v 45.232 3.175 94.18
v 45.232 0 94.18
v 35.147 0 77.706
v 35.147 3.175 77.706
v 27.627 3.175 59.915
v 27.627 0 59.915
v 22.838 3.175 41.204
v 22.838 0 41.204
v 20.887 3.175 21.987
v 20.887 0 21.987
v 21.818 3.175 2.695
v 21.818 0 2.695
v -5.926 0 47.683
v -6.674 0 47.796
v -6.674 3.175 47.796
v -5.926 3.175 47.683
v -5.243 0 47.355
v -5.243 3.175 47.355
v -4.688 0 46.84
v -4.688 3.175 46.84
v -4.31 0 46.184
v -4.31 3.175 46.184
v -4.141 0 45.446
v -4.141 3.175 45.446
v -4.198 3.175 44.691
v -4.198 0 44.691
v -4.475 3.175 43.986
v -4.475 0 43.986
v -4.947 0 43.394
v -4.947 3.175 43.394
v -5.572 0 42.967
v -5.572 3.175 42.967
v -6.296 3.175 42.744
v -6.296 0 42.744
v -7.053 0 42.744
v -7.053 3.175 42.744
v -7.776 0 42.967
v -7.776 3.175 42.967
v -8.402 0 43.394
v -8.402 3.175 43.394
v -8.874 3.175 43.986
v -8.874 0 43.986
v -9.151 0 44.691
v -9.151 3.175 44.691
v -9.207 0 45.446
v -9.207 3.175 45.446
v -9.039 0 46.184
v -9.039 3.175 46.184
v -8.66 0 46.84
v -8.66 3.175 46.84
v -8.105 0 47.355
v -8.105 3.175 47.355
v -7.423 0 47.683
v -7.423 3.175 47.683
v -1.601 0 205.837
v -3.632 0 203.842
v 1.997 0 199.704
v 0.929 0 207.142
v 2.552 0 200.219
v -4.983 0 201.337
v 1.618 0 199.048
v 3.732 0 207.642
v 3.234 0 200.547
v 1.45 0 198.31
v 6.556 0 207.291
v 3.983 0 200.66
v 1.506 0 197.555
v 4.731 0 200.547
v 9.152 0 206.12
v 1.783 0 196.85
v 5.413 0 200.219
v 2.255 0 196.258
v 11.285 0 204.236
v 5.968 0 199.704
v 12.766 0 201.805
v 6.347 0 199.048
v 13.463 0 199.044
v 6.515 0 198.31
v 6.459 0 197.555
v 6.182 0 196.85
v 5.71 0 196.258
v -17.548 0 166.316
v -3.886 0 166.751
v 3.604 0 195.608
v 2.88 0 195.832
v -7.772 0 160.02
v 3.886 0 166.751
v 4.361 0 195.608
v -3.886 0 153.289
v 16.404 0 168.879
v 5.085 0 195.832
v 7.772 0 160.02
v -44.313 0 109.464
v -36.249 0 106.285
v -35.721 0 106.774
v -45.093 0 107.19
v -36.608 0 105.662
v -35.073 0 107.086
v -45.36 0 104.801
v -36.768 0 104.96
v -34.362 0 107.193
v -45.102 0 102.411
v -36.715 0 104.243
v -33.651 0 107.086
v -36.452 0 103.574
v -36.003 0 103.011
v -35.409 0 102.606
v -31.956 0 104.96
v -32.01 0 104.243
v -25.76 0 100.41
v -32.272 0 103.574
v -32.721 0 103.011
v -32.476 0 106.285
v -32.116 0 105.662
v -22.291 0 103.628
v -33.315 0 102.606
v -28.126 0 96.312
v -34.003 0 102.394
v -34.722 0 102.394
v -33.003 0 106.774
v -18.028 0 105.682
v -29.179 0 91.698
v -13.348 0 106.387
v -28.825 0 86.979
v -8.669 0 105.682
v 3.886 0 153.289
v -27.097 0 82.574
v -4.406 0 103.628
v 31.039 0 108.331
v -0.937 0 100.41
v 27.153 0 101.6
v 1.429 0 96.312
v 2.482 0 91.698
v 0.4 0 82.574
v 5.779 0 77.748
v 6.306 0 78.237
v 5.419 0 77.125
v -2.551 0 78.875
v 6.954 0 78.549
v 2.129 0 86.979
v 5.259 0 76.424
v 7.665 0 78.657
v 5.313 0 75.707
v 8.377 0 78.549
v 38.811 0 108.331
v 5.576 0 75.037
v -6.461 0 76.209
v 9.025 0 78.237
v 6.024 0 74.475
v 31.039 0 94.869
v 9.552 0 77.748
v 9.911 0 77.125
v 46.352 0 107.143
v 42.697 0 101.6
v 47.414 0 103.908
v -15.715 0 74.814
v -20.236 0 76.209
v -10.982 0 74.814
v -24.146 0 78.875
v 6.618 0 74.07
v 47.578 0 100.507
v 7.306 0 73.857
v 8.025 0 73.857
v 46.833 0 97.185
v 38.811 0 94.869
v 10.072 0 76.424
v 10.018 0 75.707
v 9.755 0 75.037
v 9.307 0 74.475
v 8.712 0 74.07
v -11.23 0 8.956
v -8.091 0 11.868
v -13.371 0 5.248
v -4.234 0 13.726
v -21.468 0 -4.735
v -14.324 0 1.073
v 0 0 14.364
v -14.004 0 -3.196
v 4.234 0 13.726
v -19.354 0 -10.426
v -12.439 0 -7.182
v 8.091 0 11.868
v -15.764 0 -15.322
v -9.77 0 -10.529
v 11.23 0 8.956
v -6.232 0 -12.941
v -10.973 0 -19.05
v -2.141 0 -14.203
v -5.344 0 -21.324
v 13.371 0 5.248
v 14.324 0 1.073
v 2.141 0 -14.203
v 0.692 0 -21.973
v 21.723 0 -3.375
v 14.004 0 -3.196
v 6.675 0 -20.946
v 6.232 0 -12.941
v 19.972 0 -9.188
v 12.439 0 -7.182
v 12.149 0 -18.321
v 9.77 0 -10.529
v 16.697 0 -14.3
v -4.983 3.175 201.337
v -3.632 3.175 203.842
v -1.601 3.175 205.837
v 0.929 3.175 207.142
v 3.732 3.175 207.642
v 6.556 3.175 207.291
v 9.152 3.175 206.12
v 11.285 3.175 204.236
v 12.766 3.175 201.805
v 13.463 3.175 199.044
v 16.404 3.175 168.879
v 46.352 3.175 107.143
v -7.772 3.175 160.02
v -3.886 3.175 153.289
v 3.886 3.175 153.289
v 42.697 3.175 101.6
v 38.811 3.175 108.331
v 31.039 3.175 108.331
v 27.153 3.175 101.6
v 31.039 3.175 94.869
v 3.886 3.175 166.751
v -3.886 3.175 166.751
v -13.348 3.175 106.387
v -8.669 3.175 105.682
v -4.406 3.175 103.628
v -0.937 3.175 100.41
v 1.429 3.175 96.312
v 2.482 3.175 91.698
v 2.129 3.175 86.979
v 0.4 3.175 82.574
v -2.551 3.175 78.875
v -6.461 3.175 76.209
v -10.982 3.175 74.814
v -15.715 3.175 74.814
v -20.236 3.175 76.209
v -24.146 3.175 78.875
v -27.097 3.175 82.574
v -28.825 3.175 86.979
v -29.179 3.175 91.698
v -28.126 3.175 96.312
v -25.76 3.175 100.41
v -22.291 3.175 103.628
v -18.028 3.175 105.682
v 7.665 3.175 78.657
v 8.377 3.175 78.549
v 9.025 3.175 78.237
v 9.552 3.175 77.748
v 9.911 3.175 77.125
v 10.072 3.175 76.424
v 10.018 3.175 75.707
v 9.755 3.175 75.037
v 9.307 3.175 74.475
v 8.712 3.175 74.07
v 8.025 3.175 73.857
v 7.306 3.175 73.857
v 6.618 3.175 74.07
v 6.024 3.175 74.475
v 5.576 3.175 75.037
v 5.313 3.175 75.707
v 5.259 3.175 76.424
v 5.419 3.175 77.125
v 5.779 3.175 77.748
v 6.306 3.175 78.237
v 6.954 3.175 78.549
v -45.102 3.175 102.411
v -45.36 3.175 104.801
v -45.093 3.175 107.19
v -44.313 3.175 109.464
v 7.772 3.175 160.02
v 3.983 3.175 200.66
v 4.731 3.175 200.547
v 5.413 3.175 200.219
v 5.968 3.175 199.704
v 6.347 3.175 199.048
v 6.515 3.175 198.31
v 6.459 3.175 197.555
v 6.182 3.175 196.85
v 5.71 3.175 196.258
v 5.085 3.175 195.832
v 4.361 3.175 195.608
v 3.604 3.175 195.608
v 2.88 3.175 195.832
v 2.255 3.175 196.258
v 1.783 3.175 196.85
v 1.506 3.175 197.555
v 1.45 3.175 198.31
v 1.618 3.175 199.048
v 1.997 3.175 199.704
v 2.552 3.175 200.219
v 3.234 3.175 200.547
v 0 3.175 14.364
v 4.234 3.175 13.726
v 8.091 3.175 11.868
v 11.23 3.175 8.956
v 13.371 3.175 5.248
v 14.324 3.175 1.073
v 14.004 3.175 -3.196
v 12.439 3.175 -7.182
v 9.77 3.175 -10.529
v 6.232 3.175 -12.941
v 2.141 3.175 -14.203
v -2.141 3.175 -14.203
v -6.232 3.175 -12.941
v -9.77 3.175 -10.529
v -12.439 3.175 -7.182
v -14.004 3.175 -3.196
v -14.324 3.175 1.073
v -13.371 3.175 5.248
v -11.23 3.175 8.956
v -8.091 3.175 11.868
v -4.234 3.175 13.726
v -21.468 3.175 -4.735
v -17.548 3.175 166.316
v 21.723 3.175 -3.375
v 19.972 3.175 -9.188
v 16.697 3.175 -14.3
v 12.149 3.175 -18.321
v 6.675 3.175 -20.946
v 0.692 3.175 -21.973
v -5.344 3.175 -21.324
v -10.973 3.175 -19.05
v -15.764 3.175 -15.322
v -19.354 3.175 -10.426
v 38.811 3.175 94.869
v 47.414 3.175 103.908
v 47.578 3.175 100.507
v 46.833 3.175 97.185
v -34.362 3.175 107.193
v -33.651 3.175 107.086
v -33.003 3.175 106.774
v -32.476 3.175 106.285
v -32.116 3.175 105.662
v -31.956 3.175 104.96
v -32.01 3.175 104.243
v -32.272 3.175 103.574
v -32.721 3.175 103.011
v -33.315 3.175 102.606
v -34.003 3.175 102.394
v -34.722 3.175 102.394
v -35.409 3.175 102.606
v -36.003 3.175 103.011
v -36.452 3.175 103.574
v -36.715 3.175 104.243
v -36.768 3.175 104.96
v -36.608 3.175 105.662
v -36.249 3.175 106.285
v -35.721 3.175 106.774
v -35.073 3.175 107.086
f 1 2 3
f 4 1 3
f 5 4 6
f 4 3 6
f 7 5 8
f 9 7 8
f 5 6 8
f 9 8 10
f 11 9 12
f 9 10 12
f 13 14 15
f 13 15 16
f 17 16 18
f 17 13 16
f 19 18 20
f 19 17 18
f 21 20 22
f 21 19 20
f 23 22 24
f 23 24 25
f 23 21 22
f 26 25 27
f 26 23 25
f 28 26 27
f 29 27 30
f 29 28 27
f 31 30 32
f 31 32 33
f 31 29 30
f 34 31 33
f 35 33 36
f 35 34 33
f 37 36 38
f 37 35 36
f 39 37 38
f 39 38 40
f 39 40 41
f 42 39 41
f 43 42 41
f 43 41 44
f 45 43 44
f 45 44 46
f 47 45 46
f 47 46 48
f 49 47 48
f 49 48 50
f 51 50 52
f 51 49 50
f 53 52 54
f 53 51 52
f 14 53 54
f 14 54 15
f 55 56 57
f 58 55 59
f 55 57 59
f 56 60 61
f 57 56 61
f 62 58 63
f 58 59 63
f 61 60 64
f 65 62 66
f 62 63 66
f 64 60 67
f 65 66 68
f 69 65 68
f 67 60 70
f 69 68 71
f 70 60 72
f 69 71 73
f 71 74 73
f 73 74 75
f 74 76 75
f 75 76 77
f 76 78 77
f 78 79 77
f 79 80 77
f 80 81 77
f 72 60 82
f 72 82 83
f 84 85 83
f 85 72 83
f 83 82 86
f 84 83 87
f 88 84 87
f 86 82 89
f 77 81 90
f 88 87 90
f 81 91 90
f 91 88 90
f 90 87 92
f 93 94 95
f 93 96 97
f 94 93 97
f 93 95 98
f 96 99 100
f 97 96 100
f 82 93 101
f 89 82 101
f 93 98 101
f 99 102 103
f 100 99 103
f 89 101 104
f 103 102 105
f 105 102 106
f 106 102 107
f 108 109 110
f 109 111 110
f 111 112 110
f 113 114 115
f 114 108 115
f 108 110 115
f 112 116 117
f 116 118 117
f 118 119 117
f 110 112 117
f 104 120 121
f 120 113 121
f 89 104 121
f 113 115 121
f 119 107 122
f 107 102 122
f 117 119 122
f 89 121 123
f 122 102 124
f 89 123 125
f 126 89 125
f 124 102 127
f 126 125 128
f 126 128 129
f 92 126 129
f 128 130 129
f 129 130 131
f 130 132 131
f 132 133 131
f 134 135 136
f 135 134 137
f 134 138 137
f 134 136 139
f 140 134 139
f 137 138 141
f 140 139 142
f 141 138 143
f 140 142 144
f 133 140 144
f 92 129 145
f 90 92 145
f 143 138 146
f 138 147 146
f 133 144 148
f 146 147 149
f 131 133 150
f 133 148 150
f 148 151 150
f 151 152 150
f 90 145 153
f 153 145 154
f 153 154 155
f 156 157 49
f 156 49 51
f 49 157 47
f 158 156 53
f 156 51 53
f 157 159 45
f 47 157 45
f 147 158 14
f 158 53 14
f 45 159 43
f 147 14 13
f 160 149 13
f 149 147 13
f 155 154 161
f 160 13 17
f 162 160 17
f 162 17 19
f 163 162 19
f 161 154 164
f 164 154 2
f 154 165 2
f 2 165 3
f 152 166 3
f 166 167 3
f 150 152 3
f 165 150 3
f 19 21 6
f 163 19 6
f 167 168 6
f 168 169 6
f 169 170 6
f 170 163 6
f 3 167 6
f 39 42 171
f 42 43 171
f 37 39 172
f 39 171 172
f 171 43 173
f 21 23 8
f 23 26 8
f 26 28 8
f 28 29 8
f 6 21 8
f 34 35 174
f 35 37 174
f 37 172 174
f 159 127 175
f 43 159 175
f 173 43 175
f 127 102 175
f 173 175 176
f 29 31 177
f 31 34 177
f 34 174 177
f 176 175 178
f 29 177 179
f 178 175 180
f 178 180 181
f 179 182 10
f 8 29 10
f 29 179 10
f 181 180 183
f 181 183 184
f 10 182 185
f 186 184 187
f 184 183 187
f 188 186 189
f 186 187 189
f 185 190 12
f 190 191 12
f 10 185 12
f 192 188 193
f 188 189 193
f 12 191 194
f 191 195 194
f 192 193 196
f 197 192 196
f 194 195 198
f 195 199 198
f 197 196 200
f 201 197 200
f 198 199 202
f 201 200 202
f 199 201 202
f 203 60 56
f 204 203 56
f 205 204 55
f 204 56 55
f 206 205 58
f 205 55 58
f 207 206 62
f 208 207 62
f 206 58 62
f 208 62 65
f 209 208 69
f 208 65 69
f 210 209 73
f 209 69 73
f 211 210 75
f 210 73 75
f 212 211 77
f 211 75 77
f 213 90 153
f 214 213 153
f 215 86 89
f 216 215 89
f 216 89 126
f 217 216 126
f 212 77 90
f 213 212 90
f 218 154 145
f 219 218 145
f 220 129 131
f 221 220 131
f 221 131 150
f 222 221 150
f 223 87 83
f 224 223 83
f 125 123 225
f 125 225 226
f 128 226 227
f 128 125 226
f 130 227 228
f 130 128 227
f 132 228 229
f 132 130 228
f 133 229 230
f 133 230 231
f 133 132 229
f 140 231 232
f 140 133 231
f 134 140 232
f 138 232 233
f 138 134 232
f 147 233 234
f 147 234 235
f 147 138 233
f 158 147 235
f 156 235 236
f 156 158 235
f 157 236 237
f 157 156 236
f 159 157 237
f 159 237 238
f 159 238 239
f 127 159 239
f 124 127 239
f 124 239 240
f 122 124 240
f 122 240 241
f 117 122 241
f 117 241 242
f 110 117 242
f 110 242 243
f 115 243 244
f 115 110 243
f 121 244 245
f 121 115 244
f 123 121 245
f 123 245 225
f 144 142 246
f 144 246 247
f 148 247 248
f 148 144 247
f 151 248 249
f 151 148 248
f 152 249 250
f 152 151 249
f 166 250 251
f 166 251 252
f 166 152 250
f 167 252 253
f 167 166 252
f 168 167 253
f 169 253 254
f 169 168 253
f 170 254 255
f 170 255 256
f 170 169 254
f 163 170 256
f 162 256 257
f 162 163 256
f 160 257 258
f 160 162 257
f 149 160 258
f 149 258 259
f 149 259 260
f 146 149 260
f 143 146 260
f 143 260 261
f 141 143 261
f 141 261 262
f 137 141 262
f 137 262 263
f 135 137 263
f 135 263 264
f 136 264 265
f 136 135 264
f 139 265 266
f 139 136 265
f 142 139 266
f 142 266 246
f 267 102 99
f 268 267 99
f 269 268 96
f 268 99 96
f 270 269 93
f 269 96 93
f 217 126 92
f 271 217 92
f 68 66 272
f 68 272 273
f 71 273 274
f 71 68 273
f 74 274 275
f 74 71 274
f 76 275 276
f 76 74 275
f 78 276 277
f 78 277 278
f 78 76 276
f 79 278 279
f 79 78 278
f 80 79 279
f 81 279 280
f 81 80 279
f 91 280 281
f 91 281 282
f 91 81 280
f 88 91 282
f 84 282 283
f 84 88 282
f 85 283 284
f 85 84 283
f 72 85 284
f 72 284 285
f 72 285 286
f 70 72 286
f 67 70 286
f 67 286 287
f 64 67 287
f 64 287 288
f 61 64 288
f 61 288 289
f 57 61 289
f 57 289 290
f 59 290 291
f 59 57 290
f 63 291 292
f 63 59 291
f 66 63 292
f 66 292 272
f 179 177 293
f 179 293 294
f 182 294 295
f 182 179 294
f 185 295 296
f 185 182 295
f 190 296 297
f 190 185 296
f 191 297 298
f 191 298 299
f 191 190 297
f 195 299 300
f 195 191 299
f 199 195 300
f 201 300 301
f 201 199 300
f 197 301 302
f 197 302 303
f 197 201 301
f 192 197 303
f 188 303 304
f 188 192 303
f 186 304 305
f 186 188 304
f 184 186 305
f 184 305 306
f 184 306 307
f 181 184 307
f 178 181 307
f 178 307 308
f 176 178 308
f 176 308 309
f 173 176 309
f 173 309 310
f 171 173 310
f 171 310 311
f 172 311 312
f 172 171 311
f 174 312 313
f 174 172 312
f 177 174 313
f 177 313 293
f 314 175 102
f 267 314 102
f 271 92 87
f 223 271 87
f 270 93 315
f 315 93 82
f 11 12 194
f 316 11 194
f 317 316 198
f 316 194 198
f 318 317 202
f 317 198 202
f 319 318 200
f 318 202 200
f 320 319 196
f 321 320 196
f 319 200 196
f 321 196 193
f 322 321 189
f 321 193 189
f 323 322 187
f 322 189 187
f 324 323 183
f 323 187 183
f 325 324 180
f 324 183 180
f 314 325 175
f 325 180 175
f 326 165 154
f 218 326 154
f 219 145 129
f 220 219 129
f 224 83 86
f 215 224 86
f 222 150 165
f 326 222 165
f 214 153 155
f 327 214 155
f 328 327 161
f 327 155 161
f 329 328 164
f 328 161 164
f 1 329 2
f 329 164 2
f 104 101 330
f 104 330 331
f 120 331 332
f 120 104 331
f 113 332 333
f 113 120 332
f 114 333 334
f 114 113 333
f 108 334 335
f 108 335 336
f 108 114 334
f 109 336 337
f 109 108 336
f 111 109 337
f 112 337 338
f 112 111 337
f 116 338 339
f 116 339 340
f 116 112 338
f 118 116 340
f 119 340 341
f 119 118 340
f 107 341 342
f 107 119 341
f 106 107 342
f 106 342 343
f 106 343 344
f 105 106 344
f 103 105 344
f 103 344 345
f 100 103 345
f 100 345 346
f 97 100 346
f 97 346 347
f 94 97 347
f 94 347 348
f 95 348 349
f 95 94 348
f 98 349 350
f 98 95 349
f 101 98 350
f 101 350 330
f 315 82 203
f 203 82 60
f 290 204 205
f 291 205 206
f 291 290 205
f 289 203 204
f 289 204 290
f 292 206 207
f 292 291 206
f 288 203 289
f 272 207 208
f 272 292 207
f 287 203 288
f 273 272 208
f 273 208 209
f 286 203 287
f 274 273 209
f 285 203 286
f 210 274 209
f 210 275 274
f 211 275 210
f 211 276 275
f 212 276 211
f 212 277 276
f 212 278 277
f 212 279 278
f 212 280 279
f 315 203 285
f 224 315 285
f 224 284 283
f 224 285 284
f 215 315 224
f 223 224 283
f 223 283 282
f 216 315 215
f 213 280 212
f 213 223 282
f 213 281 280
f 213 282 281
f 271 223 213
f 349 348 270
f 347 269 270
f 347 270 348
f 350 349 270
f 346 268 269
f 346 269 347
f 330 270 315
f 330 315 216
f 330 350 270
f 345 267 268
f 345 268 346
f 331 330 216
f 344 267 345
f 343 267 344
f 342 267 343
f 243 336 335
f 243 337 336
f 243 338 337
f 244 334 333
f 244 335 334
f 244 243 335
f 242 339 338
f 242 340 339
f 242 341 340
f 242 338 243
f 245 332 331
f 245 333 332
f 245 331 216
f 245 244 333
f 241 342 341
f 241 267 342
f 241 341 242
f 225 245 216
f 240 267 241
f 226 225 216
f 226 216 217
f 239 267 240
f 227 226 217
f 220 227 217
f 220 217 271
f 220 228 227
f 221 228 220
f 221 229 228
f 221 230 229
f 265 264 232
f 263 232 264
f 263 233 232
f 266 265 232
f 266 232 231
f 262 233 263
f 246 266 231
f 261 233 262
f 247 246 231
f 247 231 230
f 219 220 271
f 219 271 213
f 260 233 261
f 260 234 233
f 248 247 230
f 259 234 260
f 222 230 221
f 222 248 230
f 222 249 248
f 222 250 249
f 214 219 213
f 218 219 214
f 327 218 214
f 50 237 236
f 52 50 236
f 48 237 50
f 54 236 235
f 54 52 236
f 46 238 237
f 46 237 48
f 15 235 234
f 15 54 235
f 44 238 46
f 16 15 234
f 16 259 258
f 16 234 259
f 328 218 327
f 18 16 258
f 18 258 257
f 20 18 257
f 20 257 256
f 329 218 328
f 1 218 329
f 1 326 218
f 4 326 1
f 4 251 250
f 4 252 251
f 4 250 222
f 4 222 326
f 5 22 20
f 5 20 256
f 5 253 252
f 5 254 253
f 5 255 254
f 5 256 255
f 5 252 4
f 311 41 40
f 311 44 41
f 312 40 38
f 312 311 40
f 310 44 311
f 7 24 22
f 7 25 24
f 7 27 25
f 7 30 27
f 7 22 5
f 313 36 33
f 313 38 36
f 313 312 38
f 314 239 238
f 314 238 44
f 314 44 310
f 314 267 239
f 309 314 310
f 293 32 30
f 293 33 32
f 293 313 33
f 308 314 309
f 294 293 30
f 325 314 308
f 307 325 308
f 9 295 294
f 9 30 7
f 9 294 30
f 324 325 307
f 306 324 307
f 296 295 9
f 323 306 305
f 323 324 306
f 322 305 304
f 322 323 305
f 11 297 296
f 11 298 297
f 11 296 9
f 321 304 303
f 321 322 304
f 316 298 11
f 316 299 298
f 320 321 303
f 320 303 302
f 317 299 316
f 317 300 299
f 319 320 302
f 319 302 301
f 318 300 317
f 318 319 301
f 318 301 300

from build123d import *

# Parameters (mm, degrees)
SKETCH1_R           = 2.413
SKETCH1_R_2         = 15.875
SKETCH1_R_3         = 2.54
SKETCH1_R_4         = 14.3637
BOSS_EXTRUDE1_DEPTH = 3.175


with BuildPart() as part:
    # Sketch1 → Boss-Extrude1 (new body)
    with BuildSketch(Plane(origin=(0, 0, 0), x_dir=(1, 0, 0), z_dir=(0, 1, 0))):
        with BuildLine():
            ThreePointArc((21.817896039, -2.694898534), (3.719231857, 21.666803643), (-21.467646841, 4.735314647))
            Line((-21.467646841, 4.735314647), (-45.101906724, -102.41109111))
            ThreePointArc((-45.101906724, -102.41109111), (-45.29184394, -106.003215279), (-44.312542058, -109.464486724))
            Line((-44.312542058, -109.464486724), (-17.547919723, -166.315992152))
            Line((-17.547919723, -166.315992152), (-4.982896867, -201.336685807))
            ThreePointArc((-4.982896867, -201.336685807), (5.157188126, -207.572288673), (13.462550304, -199.044391753))
            Line((13.462550304, -199.044391753), (16.403973912, -168.878817283))
            Line((16.403973912, -168.878817283), (46.351547638, -107.142924236))
            ThreePointArc((46.351547638, -107.142924236), (47.577872684, -100.506925054), (45.231649184, -94.179556443))
            ThreePointArc((45.231649184, -94.179556443), (24.882907581, -50.648948002), (21.817896039, -2.694898534))
        make_face()
        Polygon((-7.772289324, -160.02), (-3.886144662, -153.289), (3.886144662, -153.289), (7.772289324, -160.02), (3.886144662, -166.751), (-3.886144662, -166.751), align=None, mode=Mode.SUBTRACT)
        with Locations(Location((-34.362191084, -104.780048134, 0), (0, 0, 270))):
            Circle(SKETCH1_R, mode=Mode.SUBTRACT)
        with Locations(Location((-13.34845818, -90.511795634, 0), (0, 0, 270))):
            Circle(SKETCH1_R_2, mode=Mode.SUBTRACT)
        with Locations(Location((7.665274725, -76.243543134, 0), (0, 0, 270))):
            Circle(SKETCH1_R, mode=Mode.SUBTRACT)
        Polygon((42.697289324, -101.6), (38.811144662, -108.331), (31.038855338, -108.331), (27.152710676, -101.6), (31.038855338, -94.869), (38.811144662, -94.869), align=None, mode=Mode.SUBTRACT)
        with Locations(Location((-6.67422909, -45.255897817, 0), (0, 0, 270))):
            Circle(SKETCH1_R_3, mode=Mode.SUBTRACT)
        with Locations(Location((0, 0, 0), (0, 0, 270))):
            Circle(SKETCH1_R_4, mode=Mode.SUBTRACT)
        with Locations(Location((3.982512071, -198.12, 0), (0, 0, 270))):
            Circle(SKETCH1_R_3, mode=Mode.SUBTRACT)
    extrude(amount=BOSS_EXTRUDE1_DEPTH)


solid = part.part
